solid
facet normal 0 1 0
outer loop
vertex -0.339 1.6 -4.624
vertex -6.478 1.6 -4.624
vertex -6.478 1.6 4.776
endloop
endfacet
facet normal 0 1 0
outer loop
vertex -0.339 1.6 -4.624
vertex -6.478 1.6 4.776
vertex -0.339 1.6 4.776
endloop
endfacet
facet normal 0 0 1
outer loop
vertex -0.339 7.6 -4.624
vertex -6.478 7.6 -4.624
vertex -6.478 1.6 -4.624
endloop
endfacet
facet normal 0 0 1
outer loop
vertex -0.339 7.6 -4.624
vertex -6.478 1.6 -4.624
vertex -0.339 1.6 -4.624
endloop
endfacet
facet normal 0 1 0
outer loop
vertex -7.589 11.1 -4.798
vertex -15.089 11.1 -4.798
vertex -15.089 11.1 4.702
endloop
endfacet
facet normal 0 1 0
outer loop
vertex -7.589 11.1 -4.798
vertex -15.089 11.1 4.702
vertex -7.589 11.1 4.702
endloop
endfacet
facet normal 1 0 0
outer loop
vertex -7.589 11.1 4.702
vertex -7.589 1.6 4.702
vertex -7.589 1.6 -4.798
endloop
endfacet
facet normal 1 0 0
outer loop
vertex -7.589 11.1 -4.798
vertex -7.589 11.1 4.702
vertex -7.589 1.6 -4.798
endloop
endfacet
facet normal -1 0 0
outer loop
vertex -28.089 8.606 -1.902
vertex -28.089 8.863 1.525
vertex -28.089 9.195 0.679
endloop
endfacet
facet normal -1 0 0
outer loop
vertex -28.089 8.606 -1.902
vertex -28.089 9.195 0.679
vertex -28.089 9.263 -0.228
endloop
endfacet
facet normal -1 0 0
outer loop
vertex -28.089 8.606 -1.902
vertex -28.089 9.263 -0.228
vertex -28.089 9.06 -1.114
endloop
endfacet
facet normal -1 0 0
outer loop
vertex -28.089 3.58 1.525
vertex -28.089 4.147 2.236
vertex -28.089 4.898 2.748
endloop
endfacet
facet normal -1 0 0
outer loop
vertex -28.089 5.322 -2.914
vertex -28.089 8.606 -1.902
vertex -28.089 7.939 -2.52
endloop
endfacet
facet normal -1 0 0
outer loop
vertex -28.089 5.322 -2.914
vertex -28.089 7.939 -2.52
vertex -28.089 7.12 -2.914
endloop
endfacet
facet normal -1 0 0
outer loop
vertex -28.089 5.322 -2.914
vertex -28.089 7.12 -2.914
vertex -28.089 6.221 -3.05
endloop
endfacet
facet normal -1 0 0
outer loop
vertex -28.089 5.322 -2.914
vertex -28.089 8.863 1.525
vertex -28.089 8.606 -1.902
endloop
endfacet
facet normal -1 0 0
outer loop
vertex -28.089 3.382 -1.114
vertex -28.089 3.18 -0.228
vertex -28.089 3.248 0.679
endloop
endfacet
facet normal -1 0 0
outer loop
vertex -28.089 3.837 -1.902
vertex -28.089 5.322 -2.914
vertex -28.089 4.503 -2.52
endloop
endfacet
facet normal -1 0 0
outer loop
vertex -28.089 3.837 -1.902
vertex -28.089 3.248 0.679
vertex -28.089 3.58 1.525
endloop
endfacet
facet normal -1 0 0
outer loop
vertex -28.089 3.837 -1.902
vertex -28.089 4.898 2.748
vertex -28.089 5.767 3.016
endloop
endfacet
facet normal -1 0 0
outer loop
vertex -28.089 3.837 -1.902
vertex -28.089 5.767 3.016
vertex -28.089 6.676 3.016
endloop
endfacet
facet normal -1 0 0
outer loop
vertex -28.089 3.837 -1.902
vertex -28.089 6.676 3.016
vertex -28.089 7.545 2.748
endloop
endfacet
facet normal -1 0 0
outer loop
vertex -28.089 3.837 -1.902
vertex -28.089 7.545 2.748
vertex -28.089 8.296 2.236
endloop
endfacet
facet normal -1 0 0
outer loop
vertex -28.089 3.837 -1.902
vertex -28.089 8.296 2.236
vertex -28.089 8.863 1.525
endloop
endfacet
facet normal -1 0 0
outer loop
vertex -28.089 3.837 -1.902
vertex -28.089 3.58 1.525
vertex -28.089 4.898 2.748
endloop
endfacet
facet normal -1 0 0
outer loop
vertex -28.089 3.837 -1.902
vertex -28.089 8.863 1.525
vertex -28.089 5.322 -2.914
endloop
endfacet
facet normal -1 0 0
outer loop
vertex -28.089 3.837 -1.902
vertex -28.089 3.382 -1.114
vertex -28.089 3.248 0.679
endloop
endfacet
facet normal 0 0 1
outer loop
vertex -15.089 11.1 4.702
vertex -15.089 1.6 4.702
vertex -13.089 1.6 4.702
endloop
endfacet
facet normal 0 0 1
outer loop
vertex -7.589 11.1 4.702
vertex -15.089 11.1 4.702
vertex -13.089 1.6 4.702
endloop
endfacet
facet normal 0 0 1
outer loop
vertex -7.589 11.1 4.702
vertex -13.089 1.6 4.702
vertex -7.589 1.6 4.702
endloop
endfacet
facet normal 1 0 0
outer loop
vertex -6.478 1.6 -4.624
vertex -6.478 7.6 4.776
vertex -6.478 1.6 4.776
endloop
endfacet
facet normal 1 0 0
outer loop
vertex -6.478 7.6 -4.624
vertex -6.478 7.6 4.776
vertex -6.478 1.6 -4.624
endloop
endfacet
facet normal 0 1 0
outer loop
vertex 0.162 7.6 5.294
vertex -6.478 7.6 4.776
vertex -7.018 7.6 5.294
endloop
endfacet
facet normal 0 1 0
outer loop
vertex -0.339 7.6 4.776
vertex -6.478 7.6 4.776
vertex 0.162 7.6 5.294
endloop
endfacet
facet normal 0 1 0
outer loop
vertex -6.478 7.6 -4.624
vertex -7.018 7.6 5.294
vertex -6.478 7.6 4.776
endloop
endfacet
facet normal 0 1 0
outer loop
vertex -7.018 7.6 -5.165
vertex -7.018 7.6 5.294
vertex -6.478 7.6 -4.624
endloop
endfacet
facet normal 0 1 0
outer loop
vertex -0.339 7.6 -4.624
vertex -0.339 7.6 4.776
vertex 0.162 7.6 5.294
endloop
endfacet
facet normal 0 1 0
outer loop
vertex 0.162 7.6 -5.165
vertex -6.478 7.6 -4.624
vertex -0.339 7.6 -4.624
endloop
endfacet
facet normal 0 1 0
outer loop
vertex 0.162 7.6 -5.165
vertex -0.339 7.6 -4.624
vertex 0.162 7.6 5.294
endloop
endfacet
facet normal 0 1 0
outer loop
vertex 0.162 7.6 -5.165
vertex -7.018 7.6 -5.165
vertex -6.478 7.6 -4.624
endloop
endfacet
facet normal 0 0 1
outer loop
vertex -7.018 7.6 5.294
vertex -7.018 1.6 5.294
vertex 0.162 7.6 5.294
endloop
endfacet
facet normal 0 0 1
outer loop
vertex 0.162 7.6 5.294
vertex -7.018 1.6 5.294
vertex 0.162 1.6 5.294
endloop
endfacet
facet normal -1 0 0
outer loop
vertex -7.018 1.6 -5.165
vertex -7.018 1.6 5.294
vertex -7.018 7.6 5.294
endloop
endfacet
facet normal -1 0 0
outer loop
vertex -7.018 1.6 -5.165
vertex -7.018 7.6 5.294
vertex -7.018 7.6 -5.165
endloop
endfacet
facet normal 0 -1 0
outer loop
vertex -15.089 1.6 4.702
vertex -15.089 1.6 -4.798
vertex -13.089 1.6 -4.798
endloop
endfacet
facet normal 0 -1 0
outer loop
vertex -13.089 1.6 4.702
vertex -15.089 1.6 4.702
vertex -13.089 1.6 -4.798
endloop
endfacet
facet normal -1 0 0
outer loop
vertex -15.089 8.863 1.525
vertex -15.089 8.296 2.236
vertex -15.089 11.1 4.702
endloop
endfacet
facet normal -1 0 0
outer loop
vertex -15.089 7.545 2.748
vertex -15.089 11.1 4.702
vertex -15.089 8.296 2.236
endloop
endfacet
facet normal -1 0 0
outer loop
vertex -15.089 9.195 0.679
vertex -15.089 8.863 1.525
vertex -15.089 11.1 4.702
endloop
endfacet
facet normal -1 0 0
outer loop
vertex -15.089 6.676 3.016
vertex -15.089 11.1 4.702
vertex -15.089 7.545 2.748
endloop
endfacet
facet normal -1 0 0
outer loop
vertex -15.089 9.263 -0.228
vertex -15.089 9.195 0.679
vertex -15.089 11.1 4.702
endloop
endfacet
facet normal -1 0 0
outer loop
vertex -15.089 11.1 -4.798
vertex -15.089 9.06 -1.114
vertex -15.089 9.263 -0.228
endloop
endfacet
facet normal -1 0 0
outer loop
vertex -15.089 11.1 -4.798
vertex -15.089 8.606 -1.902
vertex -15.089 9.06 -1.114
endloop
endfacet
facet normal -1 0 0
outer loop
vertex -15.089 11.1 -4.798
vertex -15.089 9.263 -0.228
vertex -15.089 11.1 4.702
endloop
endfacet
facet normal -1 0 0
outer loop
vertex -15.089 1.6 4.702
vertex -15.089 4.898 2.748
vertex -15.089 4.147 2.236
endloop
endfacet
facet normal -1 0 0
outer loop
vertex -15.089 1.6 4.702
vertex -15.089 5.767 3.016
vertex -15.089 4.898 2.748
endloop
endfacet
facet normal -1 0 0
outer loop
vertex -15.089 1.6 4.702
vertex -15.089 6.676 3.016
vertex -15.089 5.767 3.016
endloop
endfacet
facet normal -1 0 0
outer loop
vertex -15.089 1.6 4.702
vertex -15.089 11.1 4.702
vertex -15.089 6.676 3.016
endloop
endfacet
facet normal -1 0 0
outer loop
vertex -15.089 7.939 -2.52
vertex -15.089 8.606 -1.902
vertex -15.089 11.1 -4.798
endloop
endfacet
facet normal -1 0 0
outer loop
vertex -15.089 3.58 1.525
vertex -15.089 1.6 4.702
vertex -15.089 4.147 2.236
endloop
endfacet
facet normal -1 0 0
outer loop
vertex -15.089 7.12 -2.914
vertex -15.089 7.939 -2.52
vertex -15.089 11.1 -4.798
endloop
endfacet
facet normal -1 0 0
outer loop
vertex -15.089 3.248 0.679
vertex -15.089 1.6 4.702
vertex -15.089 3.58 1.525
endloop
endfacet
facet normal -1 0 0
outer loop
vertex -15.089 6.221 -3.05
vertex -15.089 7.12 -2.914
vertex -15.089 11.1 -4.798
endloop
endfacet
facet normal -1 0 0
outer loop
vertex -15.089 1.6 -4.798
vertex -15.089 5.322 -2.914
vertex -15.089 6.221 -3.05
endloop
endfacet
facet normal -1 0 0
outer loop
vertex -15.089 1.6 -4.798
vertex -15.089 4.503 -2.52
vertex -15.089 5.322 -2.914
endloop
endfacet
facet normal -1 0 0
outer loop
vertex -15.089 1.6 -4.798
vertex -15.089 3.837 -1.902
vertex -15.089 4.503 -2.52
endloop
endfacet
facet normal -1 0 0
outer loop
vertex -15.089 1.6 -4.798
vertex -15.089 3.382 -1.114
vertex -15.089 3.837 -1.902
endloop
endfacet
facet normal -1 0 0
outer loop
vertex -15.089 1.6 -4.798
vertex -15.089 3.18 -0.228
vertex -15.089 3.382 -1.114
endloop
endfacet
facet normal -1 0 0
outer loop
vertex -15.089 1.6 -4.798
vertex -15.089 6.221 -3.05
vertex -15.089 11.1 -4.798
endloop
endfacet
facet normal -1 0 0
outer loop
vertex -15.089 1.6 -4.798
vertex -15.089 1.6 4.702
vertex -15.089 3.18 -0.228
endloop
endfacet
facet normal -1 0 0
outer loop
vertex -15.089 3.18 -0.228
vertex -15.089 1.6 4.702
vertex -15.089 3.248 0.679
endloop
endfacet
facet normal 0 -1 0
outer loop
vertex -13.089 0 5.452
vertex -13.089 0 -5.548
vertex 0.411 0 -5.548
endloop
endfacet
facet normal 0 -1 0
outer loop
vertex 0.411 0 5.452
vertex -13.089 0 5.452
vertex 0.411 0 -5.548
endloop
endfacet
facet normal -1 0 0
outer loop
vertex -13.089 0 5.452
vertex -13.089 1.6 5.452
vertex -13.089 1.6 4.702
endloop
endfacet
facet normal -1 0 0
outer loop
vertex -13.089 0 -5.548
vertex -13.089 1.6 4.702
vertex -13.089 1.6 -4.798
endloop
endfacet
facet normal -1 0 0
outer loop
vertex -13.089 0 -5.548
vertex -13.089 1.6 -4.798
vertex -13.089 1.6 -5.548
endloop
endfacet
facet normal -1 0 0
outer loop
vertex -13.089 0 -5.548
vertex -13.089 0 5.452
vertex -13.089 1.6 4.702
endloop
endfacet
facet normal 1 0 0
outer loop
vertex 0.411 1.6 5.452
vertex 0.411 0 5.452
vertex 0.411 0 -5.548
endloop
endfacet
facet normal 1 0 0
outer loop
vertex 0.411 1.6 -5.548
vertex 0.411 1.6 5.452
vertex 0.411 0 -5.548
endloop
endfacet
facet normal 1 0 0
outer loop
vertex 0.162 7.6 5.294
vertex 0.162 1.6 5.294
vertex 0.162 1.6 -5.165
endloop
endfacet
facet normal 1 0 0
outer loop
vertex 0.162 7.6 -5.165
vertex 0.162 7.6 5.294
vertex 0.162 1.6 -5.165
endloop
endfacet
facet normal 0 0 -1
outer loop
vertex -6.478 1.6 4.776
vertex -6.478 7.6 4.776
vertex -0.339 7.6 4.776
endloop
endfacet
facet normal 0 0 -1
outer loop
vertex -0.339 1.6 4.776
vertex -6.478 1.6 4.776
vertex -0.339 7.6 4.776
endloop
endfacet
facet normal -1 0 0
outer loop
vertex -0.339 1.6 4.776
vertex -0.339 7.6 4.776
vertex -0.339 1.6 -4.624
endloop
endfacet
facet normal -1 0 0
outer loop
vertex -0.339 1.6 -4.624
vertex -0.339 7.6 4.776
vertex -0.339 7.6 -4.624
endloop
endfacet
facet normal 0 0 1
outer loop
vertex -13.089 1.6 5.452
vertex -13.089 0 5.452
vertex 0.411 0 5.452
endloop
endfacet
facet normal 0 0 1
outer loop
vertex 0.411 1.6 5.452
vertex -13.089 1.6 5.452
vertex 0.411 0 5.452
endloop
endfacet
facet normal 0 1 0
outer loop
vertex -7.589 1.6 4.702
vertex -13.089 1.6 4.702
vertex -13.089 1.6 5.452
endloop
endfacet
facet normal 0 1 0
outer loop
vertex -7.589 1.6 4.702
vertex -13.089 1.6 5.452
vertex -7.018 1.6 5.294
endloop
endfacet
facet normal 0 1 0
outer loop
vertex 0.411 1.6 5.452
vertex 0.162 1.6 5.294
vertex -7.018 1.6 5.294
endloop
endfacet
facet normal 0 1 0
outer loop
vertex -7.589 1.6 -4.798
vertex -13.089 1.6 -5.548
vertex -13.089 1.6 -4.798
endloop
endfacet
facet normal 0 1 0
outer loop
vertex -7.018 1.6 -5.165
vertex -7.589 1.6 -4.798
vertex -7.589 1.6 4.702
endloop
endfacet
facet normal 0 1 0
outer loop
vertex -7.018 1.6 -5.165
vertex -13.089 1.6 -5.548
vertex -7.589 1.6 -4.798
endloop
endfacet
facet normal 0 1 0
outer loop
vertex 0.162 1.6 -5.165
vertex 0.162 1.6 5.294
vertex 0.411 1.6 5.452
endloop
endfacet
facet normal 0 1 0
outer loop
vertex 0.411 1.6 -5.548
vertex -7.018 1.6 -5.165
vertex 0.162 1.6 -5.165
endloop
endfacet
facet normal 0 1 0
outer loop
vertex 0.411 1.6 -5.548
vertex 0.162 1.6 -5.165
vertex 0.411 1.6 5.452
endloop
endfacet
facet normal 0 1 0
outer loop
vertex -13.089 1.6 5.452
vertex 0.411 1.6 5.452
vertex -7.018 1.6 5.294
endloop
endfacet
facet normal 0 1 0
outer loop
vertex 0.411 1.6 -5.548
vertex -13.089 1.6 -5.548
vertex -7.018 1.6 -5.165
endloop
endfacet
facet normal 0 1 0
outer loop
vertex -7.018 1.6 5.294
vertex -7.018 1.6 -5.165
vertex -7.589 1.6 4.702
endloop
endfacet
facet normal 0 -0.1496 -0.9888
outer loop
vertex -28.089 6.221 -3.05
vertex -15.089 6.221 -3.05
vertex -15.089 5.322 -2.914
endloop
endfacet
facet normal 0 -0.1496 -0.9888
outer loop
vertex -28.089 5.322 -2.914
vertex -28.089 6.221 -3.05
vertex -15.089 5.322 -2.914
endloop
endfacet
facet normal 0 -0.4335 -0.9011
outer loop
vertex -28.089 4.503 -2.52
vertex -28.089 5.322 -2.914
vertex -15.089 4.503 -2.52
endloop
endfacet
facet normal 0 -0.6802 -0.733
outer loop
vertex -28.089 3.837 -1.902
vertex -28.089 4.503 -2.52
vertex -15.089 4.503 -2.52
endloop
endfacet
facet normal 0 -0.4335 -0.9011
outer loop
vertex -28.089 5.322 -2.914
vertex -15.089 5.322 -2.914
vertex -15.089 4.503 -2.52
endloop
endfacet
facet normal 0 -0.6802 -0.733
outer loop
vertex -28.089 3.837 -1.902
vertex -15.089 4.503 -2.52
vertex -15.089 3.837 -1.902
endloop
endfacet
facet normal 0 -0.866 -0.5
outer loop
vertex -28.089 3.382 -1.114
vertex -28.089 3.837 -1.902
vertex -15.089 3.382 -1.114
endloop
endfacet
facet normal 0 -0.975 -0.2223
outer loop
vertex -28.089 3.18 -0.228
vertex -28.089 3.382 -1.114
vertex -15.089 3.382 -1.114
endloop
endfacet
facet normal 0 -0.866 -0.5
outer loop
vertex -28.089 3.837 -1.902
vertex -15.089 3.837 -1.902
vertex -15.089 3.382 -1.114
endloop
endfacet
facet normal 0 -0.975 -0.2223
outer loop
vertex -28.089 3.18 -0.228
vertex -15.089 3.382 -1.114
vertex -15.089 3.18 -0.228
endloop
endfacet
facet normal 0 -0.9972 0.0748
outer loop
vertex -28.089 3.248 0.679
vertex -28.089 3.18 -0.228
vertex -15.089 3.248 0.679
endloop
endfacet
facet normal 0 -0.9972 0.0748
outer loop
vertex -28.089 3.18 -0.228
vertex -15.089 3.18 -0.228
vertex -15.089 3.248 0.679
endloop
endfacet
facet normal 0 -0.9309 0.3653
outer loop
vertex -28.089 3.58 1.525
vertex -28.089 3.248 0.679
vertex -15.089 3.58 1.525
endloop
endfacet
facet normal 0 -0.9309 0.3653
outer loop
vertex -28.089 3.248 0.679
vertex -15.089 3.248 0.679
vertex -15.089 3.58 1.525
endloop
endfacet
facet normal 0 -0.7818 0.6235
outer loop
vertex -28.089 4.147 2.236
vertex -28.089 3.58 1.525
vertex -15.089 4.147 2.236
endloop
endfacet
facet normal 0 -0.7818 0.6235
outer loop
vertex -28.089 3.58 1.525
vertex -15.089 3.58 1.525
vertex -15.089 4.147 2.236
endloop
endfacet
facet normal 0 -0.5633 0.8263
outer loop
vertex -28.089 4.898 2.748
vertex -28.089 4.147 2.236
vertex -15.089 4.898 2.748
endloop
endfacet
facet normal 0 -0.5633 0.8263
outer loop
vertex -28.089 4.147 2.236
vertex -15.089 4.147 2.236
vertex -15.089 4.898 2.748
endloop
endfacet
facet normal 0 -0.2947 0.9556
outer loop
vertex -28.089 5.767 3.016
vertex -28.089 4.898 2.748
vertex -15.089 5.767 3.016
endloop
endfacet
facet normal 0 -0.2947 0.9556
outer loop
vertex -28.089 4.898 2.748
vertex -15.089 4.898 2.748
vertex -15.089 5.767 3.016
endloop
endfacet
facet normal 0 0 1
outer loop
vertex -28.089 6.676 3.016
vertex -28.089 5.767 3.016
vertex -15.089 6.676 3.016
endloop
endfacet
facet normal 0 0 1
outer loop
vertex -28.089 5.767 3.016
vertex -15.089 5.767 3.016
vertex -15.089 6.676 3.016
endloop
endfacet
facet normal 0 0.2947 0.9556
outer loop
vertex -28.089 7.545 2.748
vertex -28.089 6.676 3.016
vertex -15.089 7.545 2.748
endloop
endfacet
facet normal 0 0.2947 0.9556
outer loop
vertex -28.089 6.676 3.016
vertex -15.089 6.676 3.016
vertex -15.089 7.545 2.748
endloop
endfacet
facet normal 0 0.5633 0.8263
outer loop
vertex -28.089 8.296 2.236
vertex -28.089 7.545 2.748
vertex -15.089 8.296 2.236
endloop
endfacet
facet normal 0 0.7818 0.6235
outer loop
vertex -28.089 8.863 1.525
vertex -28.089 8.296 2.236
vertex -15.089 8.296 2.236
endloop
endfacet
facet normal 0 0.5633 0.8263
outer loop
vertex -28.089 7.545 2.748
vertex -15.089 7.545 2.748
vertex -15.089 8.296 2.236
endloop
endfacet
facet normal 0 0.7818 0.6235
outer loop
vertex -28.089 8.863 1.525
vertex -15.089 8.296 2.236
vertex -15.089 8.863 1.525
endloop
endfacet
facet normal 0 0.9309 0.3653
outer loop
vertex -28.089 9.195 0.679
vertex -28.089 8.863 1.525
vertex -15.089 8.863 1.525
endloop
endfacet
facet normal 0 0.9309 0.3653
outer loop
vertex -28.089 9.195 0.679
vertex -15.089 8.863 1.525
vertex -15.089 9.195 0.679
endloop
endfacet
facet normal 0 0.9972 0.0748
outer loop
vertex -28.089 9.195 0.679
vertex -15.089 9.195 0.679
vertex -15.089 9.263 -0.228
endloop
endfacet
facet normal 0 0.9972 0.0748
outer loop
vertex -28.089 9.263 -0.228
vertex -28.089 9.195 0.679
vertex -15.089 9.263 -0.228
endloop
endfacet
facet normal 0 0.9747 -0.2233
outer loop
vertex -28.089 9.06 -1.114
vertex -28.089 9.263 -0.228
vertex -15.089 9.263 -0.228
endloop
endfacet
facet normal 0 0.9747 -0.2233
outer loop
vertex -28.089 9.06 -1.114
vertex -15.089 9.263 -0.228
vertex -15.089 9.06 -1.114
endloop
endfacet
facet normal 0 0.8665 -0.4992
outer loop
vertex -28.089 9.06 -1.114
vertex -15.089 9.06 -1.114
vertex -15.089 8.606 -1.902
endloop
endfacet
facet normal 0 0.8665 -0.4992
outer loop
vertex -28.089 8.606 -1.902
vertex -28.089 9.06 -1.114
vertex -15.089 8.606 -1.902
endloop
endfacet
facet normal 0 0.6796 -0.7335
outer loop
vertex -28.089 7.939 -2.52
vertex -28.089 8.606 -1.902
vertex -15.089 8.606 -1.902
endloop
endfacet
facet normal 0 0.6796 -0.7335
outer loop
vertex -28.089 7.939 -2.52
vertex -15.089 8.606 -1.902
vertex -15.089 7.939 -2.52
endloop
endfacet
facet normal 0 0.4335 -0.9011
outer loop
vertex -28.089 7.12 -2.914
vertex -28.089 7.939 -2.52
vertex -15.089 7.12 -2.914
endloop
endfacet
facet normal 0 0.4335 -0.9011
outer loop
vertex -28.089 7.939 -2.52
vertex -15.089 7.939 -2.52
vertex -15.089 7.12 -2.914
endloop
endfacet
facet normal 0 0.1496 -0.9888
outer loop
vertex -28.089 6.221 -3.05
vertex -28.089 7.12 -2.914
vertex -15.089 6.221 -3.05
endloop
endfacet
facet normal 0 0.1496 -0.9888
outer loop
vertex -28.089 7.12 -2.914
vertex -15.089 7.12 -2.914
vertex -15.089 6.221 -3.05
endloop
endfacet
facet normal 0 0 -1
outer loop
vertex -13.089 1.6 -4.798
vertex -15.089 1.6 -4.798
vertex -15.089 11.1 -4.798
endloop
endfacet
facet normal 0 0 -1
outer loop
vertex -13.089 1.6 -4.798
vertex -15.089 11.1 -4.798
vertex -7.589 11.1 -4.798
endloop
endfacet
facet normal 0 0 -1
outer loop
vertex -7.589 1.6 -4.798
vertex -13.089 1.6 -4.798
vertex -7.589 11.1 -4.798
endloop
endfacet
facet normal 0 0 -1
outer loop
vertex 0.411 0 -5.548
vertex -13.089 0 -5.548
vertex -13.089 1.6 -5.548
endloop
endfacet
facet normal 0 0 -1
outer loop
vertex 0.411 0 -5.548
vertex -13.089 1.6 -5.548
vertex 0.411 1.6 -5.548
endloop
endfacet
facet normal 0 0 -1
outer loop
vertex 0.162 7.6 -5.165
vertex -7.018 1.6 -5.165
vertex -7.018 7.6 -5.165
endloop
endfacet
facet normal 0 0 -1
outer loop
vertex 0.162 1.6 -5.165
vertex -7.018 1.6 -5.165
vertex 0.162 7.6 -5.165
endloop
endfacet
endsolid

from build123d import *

# Parameters (mm, degrees)
SKETCH_1_W          = 13.5
SKETCH_1_H          = 11
EXTRUDE_1_DEPTH     = 1.6
SKETCH_2_W          = 7.5
SKETCH_2_H          = 9.5
EXTRUDE_2_DEPTH     = 9.5
SKETCH_3_W          = 7.180285824
SKETCH_3_H          = 10.458318516
EXTRUDE_3_DEPTH     = 6
SKETCH_4_W          = 6.139304191
SKETCH_4_H          = 9.400260038
CUT_EXTRUDE_1_DEPTH = 6
SKETCH_5_R          = 3.05
EXTRUDE_4_DEPTH     = 13


with BuildPart() as part:
    # 草图1 → 凸台-拉伸1 (new body)
    with BuildSketch(Plane(origin=(0, 0, 0), x_dir=(1, 0, 0), z_dir=(0, 1, 0))):
        with Locations((-6.339102869, 0.04845815)):
            Rectangle(SKETCH_1_W, SKETCH_1_H)
    extrude(amount=EXTRUDE_1_DEPTH)

    # 草图2 → 凸台-拉伸2 (add)
    with BuildSketch(Plane(origin=(0, 1.6, 0), x_dir=(1, 0, 0), z_dir=(0, 1, 0))):
        with Locations((-11.339102869, 0.04845815)):
            Rectangle(SKETCH_2_W, SKETCH_2_H)
    extrude(amount=EXTRUDE_2_DEPTH)

    # 草图3 → 凸台-拉伸3 (add)
    with BuildSketch(Plane(origin=(0, 1.6, 0), x_dir=(1, 0, 0), z_dir=(0, 1, 0))):
        with Locations((-3.428185131, -0.064528037)):
            Rectangle(SKETCH_3_W, SKETCH_3_H)
    extrude(amount=EXTRUDE_3_DEPTH)

    # 草图4 → 切除-拉伸1 (cut)
    with BuildSketch(Plane(origin=(0, 7.6, 0), x_dir=(1, 0, 0), z_dir=(0, 1, 0))):
        with Locations((-3.408558638, -0.075891751)):
            Rectangle(SKETCH_4_W, SKETCH_4_H)
    extrude(amount=-CUT_EXTRUDE_1_DEPTH, mode=Mode.SUBTRACT)

    # 草图5 → 凸台-拉伸4 (add)
    with BuildSketch(Plane.ZY.offset(15.089102869)):
        with Locations(Location((0, 6.221255945, 0), (0, 0, 180))):
            Circle(SKETCH_5_R)
    extrude(amount=EXTRUDE_4_DEPTH)


solid = part.part
